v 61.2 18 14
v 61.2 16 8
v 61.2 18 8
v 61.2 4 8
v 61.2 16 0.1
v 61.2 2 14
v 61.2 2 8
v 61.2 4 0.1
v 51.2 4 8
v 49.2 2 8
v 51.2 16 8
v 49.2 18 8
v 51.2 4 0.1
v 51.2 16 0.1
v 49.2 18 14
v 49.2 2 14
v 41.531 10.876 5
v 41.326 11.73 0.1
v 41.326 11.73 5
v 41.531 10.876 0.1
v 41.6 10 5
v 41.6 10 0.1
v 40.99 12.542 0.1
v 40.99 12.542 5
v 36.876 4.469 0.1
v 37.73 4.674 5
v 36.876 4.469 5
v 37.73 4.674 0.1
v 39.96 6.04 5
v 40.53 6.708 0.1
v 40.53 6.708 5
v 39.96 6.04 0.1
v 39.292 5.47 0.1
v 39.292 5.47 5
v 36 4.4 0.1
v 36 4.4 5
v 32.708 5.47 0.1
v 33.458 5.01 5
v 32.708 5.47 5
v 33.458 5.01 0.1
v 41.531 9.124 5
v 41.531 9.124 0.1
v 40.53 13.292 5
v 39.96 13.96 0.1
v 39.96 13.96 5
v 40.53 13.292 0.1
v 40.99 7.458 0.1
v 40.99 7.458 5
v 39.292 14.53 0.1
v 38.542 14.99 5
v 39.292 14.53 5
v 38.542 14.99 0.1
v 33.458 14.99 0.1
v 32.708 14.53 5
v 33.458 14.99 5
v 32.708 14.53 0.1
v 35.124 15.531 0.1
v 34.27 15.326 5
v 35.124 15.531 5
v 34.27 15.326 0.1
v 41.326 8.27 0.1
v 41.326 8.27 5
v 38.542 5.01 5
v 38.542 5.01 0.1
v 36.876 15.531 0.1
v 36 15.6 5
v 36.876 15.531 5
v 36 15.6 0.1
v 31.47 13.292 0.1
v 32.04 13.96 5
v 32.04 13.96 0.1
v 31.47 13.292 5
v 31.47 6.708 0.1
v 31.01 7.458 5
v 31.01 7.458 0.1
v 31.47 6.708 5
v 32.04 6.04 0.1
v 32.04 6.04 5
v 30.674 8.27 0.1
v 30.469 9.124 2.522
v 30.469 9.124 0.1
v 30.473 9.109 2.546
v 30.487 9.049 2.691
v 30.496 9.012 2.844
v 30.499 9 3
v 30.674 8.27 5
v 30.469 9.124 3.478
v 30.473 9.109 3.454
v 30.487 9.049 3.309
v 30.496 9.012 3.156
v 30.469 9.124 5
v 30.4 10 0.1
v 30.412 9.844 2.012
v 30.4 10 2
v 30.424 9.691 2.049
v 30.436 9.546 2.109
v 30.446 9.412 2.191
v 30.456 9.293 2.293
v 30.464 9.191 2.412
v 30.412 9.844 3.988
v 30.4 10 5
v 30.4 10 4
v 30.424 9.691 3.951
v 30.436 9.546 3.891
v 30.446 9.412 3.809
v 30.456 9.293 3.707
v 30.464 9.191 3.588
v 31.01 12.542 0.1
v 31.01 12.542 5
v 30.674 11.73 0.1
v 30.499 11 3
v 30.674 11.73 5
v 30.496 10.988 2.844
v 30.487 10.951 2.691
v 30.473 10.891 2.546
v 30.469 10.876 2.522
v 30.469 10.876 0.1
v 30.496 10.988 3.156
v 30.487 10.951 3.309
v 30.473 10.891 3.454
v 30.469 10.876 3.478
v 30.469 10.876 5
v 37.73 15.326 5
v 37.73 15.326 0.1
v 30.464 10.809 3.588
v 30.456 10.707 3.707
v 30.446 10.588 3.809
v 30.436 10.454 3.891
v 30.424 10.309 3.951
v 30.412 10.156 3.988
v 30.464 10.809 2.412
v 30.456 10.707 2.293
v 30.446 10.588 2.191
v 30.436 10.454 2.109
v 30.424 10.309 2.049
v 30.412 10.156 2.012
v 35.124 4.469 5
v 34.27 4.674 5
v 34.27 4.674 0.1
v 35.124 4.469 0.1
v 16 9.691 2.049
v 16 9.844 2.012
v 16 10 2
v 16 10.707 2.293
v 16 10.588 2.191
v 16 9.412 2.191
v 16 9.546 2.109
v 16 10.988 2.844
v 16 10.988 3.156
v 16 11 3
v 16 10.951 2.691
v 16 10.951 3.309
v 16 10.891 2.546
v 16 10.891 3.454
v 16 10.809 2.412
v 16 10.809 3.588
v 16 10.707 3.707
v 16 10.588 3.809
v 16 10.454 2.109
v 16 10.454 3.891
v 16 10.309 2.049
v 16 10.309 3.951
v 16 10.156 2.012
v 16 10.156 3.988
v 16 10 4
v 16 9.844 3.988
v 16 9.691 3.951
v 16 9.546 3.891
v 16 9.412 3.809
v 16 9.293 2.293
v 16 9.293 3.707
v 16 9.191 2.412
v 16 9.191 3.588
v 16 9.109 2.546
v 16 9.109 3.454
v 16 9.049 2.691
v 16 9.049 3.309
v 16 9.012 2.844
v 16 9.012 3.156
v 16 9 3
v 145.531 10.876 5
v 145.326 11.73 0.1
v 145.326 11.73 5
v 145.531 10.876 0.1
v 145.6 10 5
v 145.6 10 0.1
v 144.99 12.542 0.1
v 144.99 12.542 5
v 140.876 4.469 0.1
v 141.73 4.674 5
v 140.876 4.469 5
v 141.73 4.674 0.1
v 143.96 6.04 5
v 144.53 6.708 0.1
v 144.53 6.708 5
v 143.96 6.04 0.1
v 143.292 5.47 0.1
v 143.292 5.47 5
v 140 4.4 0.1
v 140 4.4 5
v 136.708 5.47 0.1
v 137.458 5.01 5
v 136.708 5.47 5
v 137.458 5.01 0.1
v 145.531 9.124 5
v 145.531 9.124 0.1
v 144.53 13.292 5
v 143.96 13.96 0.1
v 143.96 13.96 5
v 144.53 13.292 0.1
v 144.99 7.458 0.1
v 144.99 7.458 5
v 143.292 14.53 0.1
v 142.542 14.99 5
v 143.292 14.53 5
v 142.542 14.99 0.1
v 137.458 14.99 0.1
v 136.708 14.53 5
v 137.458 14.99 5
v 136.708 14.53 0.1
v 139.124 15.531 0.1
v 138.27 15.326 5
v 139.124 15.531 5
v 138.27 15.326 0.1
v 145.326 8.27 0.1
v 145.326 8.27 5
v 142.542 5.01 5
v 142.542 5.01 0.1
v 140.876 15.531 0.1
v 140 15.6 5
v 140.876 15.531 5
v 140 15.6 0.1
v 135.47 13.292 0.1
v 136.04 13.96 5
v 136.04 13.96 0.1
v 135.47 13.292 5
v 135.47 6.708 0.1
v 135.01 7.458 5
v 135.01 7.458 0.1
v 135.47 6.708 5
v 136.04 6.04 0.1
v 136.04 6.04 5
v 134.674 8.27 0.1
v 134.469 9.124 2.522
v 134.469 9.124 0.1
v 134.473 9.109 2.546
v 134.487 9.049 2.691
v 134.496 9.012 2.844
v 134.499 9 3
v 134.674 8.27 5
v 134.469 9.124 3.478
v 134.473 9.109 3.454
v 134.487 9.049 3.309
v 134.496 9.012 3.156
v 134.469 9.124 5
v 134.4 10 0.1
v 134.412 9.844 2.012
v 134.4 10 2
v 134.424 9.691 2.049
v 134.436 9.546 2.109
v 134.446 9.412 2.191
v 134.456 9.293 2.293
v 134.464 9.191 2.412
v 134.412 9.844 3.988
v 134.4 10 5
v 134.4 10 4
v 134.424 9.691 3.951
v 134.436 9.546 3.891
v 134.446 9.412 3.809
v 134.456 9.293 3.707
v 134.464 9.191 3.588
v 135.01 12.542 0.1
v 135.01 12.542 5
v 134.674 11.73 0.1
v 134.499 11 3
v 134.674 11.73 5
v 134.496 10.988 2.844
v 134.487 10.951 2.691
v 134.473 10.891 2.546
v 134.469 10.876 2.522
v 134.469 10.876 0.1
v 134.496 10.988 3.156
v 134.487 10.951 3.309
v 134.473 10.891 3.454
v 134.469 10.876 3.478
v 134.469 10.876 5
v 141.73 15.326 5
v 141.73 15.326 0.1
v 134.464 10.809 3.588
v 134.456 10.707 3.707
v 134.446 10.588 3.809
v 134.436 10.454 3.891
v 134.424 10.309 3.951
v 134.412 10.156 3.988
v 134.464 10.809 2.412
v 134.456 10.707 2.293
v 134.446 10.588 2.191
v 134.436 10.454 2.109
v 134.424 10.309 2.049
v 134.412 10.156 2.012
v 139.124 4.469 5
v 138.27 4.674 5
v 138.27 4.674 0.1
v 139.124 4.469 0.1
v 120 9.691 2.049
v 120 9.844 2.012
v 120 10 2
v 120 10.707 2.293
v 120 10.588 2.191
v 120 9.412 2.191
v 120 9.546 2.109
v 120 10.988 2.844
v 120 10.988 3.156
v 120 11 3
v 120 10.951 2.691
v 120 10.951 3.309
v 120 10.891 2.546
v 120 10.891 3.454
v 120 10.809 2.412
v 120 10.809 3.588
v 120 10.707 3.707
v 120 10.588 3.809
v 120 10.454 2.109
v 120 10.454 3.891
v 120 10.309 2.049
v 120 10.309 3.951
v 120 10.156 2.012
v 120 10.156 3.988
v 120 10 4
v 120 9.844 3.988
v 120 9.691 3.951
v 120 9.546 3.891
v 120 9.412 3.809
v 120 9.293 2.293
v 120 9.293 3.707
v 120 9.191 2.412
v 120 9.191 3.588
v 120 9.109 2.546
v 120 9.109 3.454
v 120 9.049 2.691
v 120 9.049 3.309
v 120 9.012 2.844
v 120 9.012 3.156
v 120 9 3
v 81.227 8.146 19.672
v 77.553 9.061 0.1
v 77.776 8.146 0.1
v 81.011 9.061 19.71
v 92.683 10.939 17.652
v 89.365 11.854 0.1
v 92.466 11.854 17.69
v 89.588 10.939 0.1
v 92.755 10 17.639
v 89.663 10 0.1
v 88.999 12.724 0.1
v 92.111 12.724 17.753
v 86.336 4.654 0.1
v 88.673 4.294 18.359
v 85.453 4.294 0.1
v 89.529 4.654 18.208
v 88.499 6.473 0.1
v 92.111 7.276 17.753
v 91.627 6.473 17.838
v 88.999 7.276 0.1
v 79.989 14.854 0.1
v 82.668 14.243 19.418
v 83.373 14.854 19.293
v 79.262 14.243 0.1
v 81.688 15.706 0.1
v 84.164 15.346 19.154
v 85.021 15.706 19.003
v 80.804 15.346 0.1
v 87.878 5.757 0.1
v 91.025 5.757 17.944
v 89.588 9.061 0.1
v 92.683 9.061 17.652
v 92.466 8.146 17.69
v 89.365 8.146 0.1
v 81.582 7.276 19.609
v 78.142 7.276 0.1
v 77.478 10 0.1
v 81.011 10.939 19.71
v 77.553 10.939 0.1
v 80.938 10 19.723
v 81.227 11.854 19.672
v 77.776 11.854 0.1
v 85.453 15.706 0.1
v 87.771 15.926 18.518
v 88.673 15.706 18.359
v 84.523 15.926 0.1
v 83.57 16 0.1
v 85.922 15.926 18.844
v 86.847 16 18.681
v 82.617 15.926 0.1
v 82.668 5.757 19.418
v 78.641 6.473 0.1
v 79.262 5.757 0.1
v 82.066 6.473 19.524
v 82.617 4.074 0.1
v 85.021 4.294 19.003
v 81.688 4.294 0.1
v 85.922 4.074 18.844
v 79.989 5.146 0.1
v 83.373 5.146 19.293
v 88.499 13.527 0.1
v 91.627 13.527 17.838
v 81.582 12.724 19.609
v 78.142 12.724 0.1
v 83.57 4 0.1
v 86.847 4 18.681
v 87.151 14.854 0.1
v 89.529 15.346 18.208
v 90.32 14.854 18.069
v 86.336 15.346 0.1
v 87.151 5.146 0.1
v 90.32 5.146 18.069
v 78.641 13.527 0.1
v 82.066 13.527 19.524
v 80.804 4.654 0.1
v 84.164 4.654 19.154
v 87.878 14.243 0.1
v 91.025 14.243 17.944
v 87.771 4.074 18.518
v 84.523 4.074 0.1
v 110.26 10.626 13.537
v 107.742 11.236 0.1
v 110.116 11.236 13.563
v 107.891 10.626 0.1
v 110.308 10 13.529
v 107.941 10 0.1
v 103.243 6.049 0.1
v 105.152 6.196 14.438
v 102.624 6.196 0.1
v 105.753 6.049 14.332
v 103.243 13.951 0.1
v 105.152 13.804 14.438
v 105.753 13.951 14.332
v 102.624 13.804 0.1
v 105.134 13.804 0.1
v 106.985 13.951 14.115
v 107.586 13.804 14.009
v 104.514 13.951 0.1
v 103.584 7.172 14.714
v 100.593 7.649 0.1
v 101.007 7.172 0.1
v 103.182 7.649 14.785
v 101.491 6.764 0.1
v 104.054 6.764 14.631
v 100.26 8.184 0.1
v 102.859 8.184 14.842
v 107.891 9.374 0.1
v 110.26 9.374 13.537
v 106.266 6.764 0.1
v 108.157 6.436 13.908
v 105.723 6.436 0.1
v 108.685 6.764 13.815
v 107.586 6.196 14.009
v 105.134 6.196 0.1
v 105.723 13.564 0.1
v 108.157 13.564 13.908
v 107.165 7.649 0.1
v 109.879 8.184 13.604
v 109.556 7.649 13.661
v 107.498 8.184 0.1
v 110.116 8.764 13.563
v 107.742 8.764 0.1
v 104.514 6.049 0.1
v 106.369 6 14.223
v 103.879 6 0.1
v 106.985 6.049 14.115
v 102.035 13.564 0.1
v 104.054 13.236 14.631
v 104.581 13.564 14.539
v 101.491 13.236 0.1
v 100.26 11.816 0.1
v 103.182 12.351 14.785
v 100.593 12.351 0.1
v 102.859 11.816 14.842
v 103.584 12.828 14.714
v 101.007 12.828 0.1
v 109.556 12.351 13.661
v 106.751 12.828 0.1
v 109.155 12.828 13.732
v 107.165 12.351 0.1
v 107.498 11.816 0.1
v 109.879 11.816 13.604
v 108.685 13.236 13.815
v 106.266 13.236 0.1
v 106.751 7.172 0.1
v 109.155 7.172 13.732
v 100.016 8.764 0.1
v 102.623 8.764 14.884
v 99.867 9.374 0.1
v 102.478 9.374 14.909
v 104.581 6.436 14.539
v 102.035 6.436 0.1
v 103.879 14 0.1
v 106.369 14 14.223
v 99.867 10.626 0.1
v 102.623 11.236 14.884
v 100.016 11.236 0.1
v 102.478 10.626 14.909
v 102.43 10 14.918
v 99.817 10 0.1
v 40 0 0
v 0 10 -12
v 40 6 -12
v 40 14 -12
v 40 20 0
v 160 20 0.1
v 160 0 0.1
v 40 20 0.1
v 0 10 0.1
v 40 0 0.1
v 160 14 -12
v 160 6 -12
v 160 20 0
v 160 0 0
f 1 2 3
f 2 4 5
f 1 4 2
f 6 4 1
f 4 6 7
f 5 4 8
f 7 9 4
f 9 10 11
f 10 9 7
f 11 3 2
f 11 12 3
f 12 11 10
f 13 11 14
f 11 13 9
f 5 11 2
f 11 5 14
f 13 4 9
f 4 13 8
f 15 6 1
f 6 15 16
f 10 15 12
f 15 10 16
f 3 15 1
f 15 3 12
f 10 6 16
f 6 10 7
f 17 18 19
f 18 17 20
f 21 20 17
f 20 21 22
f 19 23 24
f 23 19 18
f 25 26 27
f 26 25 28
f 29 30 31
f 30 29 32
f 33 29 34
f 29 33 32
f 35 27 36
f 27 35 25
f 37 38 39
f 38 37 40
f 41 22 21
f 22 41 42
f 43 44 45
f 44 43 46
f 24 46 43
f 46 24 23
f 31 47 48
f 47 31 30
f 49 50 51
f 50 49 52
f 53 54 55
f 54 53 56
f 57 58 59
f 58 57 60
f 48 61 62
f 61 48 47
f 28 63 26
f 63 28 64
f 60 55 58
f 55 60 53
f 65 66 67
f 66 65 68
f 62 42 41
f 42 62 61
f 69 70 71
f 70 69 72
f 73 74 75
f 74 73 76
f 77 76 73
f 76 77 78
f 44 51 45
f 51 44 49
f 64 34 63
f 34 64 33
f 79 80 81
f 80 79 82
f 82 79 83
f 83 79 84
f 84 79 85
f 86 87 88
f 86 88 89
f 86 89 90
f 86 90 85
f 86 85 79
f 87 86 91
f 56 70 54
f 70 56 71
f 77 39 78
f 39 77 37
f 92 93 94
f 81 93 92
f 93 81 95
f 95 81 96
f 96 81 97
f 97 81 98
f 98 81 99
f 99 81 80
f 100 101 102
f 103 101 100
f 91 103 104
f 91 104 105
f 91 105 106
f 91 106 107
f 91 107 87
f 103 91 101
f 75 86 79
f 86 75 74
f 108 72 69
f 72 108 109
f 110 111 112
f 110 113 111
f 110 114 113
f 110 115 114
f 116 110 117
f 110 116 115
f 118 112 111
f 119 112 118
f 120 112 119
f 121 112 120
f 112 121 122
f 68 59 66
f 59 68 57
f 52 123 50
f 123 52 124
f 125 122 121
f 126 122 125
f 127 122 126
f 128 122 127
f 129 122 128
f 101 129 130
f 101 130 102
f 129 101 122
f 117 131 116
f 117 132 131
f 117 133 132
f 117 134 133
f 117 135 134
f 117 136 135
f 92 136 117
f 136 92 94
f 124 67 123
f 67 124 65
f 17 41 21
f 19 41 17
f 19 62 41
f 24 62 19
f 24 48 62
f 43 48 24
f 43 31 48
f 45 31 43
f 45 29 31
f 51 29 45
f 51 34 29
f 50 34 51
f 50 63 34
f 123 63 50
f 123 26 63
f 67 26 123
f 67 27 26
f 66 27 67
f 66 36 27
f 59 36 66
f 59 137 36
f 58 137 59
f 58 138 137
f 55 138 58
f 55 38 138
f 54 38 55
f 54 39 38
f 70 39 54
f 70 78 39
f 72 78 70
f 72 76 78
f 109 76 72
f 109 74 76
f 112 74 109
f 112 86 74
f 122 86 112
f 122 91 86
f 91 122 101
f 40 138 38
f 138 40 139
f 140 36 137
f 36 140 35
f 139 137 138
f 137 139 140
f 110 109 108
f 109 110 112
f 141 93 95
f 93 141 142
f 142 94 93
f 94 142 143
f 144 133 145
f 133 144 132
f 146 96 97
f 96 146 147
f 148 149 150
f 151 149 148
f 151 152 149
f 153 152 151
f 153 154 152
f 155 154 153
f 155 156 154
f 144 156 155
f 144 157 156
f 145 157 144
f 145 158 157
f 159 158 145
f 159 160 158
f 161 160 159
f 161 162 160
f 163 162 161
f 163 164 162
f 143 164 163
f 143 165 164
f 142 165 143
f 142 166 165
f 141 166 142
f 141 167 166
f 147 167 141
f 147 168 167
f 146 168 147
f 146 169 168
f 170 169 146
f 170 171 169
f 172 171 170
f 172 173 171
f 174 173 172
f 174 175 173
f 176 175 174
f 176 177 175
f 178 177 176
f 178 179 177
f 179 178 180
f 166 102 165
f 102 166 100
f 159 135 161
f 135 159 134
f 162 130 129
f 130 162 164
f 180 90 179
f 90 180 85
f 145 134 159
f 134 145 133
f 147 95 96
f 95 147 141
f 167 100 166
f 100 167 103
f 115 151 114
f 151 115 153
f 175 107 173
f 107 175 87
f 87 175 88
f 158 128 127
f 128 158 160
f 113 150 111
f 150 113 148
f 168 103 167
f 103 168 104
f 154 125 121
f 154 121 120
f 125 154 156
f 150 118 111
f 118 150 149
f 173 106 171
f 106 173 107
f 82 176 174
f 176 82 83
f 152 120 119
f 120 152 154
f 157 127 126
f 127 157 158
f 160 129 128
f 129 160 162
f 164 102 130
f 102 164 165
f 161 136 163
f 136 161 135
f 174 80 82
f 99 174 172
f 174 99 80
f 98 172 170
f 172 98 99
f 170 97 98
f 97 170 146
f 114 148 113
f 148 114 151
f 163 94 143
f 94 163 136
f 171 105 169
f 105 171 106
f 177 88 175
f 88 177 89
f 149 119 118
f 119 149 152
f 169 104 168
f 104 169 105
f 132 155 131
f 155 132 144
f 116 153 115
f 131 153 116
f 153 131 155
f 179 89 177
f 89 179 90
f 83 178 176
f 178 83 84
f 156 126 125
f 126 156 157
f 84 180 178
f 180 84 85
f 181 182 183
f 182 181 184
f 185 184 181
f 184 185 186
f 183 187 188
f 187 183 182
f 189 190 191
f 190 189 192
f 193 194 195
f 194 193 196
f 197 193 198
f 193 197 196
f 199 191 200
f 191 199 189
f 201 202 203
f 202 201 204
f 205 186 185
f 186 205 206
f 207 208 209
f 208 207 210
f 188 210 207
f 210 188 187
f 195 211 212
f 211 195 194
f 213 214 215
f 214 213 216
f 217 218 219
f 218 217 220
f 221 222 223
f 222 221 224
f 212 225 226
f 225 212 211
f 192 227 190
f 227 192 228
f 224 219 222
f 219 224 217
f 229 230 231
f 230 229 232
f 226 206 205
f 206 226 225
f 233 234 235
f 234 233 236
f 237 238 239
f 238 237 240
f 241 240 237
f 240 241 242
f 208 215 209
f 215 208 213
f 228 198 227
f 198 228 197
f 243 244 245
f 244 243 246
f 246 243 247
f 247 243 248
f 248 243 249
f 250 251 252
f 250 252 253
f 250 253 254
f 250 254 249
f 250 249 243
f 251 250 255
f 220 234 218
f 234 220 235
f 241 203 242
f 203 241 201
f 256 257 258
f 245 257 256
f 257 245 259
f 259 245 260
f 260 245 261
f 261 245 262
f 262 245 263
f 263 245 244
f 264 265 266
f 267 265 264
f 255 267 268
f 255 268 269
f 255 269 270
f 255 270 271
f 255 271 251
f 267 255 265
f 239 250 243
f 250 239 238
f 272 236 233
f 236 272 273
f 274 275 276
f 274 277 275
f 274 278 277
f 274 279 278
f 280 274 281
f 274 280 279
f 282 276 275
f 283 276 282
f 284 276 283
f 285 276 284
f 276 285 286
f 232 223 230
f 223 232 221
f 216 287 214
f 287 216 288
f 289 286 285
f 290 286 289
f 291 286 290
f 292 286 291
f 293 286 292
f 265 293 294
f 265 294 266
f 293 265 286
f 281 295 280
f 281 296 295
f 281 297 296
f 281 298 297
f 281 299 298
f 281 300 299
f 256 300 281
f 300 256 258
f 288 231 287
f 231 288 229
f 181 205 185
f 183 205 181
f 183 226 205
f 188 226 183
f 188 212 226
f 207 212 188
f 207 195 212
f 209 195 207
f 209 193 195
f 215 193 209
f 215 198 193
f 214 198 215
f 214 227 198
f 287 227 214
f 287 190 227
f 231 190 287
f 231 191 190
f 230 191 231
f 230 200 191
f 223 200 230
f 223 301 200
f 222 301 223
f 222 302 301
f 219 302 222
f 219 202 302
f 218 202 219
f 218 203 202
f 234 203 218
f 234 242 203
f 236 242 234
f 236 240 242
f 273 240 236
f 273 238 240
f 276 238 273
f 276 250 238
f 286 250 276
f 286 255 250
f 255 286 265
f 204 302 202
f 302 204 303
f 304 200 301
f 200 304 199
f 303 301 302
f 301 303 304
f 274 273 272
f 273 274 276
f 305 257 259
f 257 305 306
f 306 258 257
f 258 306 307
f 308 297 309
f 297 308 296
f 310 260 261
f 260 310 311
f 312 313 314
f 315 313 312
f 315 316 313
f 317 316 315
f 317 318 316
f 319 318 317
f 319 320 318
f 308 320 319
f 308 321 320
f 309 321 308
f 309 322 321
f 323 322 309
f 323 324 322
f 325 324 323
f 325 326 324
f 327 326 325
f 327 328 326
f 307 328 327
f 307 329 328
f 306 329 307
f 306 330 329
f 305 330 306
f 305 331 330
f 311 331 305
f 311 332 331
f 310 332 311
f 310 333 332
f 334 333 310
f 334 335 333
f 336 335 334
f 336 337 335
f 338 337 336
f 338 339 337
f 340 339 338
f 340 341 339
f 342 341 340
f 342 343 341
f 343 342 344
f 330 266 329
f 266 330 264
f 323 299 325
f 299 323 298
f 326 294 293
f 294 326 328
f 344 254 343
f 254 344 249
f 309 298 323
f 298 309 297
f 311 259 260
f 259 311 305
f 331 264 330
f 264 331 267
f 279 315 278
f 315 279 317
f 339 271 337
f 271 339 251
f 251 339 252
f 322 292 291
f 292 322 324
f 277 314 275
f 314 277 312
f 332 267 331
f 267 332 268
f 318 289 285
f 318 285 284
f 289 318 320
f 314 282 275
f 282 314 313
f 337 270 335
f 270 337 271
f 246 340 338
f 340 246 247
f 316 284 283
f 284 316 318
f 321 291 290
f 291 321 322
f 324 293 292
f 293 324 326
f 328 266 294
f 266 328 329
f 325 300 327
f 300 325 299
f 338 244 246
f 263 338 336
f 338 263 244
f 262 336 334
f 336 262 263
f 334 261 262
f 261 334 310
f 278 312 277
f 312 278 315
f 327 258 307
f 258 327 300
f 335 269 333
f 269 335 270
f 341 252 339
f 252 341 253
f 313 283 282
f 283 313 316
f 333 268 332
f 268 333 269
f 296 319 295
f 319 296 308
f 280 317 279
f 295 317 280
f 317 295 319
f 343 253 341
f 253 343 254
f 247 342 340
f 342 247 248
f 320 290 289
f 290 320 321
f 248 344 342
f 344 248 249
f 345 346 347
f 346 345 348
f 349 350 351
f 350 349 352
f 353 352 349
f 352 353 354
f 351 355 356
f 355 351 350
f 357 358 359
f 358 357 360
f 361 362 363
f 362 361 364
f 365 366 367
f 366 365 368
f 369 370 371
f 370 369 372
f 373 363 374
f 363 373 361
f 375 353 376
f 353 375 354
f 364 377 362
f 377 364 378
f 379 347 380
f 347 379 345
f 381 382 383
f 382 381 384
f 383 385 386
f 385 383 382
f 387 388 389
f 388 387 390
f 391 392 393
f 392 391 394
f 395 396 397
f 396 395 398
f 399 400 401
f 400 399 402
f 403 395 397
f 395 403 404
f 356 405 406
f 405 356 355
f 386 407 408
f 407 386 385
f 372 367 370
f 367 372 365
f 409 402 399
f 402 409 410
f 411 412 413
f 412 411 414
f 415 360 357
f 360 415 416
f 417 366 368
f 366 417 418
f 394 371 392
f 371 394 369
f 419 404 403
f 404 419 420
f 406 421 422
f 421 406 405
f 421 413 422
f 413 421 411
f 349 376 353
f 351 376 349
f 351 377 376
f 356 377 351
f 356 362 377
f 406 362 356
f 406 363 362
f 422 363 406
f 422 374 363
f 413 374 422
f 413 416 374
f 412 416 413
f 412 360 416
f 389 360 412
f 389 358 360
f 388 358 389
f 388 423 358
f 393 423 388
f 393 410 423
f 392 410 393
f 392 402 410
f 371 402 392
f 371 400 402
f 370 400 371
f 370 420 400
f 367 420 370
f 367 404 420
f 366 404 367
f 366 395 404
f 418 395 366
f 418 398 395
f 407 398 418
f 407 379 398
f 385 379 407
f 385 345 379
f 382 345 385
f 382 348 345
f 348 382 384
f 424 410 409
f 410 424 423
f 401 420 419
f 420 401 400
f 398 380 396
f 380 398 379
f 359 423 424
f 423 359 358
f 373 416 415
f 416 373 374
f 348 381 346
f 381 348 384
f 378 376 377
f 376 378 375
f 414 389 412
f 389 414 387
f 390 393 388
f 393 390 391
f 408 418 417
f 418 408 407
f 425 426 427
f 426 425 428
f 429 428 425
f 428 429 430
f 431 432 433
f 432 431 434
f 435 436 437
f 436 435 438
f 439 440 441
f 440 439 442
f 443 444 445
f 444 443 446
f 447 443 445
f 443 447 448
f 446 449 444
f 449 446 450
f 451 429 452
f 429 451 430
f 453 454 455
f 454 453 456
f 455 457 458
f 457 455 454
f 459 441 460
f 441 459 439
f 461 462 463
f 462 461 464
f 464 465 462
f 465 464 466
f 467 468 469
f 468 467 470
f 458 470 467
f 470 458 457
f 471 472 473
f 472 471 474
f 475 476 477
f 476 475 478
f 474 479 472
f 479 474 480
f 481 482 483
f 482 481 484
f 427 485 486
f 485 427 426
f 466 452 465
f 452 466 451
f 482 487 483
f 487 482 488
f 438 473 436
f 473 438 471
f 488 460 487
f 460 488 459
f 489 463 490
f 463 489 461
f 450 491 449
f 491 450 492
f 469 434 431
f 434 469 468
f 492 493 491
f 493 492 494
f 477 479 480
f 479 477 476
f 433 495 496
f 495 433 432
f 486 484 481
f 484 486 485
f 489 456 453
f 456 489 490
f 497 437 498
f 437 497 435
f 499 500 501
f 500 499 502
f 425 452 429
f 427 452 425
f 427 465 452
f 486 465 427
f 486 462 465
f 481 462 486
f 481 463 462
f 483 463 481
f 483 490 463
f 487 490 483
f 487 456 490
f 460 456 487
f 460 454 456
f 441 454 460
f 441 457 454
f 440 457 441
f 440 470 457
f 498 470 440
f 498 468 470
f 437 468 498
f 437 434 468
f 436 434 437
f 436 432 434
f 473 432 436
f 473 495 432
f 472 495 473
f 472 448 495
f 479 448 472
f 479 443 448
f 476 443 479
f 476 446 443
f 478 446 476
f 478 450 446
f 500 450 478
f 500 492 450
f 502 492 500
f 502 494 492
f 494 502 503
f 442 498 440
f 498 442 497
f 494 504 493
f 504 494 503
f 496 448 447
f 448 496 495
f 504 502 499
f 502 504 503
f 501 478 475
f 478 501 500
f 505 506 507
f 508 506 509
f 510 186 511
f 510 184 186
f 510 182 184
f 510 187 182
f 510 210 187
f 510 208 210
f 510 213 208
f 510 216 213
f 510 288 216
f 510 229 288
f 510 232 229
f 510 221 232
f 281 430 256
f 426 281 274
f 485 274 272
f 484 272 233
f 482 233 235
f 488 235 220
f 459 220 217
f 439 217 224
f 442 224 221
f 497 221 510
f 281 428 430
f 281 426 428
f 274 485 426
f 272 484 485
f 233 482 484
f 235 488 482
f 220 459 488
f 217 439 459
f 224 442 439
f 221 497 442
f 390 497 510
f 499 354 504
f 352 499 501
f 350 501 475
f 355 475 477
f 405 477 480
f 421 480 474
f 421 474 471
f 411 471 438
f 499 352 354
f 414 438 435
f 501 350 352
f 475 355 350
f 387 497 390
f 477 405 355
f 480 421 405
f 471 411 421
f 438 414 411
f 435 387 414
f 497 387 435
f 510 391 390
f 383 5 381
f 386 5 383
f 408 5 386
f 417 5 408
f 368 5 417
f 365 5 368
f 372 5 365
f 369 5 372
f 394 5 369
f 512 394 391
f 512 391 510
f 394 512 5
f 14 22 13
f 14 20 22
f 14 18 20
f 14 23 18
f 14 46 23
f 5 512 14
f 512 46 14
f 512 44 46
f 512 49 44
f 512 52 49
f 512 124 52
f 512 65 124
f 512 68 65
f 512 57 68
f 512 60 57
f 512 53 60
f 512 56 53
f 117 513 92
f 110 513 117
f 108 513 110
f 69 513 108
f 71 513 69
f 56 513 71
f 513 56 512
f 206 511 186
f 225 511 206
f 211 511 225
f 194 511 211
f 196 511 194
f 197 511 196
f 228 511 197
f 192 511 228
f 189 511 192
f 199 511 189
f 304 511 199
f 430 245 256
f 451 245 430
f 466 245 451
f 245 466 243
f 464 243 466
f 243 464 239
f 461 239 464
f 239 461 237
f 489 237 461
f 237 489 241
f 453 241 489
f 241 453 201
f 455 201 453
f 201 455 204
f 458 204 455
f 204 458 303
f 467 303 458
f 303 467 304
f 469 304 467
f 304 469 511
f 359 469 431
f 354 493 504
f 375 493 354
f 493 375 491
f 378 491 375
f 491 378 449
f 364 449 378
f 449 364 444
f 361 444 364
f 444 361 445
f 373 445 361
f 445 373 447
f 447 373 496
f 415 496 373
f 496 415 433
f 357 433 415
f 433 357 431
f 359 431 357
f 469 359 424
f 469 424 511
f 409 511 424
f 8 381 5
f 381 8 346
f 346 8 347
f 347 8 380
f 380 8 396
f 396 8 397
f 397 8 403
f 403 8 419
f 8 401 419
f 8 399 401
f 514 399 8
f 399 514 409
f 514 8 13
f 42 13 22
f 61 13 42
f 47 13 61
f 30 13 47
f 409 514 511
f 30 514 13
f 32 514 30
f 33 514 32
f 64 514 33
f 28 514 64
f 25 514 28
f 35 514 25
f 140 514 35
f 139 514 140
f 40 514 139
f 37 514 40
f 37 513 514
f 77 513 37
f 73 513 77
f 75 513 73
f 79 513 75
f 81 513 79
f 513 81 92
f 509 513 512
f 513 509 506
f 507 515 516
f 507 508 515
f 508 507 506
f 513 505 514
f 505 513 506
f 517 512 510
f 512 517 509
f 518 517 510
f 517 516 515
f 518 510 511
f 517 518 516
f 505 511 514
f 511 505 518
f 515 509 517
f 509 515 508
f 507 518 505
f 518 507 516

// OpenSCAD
$fn = 40;

// 寸法
L = 160;
B = 20;
H = 12;

// 船首長さ
bow_len = 40;

// 船底幅倍率
bottom_scale = 0.4;


// 船首
module bow() {
  hull() {
    // 上面
    linear_extrude(height = 0.1)
      polygon([
        [0, B / 2], 
        [bow_len, B], 
        [bow_len, 0]
      ]);

    // 底面
    translate([0, B * (1 - bottom_scale) / 2, -H])
      linear_extrude(height = 0.1)
        scale([1, bottom_scale])
          polygon([
            [0, B / 2], 
            [bow_len, B], 
            [bow_len, 0]
          ]);
  }
}


// 船体中央
module mid_body() {
  hull() {
    // 上面
    translate([bow_len, 0, 0])
      linear_extrude(height = 0.1)
        square([L - bow_len, B]);

    // 底面
    translate([bow_len, B * (1 - bottom_scale) / 2, -H])
      linear_extrude(height = 0.1)
        scale([1, bottom_scale])
          square([L - bow_len, B]);
  }
}

// 艦橋
module bridge() {
  translate([L * 0.32, B * 0.2, 0])
    union() {

      cube([10, B * 0.6, 8]);

      translate([-2, B * -0.1, 8])
        cube([12, B * 0.8, 6]);
    }
}

// 主砲
module main_gun() {
  translate([bow_len * 0.9, B / 2, 0])
    union() {
      cylinder(h = 5, r = 5.6);

      translate([0, 0, 3])
        rotate([180, 90, 0])
          cylinder(h = 20, r = 1);

    }
  translate([bow_len * 3.5, B / 2, 0])
    union() {
      cylinder(h = 5, r = 5.6);

      translate([0, 0, 3])
        rotate([180, 90, 0])
          cylinder(h = 20, r = 1);

    }
}

// 煙突
module funnel() {
  translate([L * 0.52, B / 2, -2])
    rotate([0, 10, 0])
      union() {
        cylinder(h = 21, r = 6);

        translate([20, 0, 2])
          cylinder(h = 18, r = 4);
      }
}

// 組み立て
union() {
  bow();
  mid_body();
  bridge();
  main_gun();
  funnel();
}
